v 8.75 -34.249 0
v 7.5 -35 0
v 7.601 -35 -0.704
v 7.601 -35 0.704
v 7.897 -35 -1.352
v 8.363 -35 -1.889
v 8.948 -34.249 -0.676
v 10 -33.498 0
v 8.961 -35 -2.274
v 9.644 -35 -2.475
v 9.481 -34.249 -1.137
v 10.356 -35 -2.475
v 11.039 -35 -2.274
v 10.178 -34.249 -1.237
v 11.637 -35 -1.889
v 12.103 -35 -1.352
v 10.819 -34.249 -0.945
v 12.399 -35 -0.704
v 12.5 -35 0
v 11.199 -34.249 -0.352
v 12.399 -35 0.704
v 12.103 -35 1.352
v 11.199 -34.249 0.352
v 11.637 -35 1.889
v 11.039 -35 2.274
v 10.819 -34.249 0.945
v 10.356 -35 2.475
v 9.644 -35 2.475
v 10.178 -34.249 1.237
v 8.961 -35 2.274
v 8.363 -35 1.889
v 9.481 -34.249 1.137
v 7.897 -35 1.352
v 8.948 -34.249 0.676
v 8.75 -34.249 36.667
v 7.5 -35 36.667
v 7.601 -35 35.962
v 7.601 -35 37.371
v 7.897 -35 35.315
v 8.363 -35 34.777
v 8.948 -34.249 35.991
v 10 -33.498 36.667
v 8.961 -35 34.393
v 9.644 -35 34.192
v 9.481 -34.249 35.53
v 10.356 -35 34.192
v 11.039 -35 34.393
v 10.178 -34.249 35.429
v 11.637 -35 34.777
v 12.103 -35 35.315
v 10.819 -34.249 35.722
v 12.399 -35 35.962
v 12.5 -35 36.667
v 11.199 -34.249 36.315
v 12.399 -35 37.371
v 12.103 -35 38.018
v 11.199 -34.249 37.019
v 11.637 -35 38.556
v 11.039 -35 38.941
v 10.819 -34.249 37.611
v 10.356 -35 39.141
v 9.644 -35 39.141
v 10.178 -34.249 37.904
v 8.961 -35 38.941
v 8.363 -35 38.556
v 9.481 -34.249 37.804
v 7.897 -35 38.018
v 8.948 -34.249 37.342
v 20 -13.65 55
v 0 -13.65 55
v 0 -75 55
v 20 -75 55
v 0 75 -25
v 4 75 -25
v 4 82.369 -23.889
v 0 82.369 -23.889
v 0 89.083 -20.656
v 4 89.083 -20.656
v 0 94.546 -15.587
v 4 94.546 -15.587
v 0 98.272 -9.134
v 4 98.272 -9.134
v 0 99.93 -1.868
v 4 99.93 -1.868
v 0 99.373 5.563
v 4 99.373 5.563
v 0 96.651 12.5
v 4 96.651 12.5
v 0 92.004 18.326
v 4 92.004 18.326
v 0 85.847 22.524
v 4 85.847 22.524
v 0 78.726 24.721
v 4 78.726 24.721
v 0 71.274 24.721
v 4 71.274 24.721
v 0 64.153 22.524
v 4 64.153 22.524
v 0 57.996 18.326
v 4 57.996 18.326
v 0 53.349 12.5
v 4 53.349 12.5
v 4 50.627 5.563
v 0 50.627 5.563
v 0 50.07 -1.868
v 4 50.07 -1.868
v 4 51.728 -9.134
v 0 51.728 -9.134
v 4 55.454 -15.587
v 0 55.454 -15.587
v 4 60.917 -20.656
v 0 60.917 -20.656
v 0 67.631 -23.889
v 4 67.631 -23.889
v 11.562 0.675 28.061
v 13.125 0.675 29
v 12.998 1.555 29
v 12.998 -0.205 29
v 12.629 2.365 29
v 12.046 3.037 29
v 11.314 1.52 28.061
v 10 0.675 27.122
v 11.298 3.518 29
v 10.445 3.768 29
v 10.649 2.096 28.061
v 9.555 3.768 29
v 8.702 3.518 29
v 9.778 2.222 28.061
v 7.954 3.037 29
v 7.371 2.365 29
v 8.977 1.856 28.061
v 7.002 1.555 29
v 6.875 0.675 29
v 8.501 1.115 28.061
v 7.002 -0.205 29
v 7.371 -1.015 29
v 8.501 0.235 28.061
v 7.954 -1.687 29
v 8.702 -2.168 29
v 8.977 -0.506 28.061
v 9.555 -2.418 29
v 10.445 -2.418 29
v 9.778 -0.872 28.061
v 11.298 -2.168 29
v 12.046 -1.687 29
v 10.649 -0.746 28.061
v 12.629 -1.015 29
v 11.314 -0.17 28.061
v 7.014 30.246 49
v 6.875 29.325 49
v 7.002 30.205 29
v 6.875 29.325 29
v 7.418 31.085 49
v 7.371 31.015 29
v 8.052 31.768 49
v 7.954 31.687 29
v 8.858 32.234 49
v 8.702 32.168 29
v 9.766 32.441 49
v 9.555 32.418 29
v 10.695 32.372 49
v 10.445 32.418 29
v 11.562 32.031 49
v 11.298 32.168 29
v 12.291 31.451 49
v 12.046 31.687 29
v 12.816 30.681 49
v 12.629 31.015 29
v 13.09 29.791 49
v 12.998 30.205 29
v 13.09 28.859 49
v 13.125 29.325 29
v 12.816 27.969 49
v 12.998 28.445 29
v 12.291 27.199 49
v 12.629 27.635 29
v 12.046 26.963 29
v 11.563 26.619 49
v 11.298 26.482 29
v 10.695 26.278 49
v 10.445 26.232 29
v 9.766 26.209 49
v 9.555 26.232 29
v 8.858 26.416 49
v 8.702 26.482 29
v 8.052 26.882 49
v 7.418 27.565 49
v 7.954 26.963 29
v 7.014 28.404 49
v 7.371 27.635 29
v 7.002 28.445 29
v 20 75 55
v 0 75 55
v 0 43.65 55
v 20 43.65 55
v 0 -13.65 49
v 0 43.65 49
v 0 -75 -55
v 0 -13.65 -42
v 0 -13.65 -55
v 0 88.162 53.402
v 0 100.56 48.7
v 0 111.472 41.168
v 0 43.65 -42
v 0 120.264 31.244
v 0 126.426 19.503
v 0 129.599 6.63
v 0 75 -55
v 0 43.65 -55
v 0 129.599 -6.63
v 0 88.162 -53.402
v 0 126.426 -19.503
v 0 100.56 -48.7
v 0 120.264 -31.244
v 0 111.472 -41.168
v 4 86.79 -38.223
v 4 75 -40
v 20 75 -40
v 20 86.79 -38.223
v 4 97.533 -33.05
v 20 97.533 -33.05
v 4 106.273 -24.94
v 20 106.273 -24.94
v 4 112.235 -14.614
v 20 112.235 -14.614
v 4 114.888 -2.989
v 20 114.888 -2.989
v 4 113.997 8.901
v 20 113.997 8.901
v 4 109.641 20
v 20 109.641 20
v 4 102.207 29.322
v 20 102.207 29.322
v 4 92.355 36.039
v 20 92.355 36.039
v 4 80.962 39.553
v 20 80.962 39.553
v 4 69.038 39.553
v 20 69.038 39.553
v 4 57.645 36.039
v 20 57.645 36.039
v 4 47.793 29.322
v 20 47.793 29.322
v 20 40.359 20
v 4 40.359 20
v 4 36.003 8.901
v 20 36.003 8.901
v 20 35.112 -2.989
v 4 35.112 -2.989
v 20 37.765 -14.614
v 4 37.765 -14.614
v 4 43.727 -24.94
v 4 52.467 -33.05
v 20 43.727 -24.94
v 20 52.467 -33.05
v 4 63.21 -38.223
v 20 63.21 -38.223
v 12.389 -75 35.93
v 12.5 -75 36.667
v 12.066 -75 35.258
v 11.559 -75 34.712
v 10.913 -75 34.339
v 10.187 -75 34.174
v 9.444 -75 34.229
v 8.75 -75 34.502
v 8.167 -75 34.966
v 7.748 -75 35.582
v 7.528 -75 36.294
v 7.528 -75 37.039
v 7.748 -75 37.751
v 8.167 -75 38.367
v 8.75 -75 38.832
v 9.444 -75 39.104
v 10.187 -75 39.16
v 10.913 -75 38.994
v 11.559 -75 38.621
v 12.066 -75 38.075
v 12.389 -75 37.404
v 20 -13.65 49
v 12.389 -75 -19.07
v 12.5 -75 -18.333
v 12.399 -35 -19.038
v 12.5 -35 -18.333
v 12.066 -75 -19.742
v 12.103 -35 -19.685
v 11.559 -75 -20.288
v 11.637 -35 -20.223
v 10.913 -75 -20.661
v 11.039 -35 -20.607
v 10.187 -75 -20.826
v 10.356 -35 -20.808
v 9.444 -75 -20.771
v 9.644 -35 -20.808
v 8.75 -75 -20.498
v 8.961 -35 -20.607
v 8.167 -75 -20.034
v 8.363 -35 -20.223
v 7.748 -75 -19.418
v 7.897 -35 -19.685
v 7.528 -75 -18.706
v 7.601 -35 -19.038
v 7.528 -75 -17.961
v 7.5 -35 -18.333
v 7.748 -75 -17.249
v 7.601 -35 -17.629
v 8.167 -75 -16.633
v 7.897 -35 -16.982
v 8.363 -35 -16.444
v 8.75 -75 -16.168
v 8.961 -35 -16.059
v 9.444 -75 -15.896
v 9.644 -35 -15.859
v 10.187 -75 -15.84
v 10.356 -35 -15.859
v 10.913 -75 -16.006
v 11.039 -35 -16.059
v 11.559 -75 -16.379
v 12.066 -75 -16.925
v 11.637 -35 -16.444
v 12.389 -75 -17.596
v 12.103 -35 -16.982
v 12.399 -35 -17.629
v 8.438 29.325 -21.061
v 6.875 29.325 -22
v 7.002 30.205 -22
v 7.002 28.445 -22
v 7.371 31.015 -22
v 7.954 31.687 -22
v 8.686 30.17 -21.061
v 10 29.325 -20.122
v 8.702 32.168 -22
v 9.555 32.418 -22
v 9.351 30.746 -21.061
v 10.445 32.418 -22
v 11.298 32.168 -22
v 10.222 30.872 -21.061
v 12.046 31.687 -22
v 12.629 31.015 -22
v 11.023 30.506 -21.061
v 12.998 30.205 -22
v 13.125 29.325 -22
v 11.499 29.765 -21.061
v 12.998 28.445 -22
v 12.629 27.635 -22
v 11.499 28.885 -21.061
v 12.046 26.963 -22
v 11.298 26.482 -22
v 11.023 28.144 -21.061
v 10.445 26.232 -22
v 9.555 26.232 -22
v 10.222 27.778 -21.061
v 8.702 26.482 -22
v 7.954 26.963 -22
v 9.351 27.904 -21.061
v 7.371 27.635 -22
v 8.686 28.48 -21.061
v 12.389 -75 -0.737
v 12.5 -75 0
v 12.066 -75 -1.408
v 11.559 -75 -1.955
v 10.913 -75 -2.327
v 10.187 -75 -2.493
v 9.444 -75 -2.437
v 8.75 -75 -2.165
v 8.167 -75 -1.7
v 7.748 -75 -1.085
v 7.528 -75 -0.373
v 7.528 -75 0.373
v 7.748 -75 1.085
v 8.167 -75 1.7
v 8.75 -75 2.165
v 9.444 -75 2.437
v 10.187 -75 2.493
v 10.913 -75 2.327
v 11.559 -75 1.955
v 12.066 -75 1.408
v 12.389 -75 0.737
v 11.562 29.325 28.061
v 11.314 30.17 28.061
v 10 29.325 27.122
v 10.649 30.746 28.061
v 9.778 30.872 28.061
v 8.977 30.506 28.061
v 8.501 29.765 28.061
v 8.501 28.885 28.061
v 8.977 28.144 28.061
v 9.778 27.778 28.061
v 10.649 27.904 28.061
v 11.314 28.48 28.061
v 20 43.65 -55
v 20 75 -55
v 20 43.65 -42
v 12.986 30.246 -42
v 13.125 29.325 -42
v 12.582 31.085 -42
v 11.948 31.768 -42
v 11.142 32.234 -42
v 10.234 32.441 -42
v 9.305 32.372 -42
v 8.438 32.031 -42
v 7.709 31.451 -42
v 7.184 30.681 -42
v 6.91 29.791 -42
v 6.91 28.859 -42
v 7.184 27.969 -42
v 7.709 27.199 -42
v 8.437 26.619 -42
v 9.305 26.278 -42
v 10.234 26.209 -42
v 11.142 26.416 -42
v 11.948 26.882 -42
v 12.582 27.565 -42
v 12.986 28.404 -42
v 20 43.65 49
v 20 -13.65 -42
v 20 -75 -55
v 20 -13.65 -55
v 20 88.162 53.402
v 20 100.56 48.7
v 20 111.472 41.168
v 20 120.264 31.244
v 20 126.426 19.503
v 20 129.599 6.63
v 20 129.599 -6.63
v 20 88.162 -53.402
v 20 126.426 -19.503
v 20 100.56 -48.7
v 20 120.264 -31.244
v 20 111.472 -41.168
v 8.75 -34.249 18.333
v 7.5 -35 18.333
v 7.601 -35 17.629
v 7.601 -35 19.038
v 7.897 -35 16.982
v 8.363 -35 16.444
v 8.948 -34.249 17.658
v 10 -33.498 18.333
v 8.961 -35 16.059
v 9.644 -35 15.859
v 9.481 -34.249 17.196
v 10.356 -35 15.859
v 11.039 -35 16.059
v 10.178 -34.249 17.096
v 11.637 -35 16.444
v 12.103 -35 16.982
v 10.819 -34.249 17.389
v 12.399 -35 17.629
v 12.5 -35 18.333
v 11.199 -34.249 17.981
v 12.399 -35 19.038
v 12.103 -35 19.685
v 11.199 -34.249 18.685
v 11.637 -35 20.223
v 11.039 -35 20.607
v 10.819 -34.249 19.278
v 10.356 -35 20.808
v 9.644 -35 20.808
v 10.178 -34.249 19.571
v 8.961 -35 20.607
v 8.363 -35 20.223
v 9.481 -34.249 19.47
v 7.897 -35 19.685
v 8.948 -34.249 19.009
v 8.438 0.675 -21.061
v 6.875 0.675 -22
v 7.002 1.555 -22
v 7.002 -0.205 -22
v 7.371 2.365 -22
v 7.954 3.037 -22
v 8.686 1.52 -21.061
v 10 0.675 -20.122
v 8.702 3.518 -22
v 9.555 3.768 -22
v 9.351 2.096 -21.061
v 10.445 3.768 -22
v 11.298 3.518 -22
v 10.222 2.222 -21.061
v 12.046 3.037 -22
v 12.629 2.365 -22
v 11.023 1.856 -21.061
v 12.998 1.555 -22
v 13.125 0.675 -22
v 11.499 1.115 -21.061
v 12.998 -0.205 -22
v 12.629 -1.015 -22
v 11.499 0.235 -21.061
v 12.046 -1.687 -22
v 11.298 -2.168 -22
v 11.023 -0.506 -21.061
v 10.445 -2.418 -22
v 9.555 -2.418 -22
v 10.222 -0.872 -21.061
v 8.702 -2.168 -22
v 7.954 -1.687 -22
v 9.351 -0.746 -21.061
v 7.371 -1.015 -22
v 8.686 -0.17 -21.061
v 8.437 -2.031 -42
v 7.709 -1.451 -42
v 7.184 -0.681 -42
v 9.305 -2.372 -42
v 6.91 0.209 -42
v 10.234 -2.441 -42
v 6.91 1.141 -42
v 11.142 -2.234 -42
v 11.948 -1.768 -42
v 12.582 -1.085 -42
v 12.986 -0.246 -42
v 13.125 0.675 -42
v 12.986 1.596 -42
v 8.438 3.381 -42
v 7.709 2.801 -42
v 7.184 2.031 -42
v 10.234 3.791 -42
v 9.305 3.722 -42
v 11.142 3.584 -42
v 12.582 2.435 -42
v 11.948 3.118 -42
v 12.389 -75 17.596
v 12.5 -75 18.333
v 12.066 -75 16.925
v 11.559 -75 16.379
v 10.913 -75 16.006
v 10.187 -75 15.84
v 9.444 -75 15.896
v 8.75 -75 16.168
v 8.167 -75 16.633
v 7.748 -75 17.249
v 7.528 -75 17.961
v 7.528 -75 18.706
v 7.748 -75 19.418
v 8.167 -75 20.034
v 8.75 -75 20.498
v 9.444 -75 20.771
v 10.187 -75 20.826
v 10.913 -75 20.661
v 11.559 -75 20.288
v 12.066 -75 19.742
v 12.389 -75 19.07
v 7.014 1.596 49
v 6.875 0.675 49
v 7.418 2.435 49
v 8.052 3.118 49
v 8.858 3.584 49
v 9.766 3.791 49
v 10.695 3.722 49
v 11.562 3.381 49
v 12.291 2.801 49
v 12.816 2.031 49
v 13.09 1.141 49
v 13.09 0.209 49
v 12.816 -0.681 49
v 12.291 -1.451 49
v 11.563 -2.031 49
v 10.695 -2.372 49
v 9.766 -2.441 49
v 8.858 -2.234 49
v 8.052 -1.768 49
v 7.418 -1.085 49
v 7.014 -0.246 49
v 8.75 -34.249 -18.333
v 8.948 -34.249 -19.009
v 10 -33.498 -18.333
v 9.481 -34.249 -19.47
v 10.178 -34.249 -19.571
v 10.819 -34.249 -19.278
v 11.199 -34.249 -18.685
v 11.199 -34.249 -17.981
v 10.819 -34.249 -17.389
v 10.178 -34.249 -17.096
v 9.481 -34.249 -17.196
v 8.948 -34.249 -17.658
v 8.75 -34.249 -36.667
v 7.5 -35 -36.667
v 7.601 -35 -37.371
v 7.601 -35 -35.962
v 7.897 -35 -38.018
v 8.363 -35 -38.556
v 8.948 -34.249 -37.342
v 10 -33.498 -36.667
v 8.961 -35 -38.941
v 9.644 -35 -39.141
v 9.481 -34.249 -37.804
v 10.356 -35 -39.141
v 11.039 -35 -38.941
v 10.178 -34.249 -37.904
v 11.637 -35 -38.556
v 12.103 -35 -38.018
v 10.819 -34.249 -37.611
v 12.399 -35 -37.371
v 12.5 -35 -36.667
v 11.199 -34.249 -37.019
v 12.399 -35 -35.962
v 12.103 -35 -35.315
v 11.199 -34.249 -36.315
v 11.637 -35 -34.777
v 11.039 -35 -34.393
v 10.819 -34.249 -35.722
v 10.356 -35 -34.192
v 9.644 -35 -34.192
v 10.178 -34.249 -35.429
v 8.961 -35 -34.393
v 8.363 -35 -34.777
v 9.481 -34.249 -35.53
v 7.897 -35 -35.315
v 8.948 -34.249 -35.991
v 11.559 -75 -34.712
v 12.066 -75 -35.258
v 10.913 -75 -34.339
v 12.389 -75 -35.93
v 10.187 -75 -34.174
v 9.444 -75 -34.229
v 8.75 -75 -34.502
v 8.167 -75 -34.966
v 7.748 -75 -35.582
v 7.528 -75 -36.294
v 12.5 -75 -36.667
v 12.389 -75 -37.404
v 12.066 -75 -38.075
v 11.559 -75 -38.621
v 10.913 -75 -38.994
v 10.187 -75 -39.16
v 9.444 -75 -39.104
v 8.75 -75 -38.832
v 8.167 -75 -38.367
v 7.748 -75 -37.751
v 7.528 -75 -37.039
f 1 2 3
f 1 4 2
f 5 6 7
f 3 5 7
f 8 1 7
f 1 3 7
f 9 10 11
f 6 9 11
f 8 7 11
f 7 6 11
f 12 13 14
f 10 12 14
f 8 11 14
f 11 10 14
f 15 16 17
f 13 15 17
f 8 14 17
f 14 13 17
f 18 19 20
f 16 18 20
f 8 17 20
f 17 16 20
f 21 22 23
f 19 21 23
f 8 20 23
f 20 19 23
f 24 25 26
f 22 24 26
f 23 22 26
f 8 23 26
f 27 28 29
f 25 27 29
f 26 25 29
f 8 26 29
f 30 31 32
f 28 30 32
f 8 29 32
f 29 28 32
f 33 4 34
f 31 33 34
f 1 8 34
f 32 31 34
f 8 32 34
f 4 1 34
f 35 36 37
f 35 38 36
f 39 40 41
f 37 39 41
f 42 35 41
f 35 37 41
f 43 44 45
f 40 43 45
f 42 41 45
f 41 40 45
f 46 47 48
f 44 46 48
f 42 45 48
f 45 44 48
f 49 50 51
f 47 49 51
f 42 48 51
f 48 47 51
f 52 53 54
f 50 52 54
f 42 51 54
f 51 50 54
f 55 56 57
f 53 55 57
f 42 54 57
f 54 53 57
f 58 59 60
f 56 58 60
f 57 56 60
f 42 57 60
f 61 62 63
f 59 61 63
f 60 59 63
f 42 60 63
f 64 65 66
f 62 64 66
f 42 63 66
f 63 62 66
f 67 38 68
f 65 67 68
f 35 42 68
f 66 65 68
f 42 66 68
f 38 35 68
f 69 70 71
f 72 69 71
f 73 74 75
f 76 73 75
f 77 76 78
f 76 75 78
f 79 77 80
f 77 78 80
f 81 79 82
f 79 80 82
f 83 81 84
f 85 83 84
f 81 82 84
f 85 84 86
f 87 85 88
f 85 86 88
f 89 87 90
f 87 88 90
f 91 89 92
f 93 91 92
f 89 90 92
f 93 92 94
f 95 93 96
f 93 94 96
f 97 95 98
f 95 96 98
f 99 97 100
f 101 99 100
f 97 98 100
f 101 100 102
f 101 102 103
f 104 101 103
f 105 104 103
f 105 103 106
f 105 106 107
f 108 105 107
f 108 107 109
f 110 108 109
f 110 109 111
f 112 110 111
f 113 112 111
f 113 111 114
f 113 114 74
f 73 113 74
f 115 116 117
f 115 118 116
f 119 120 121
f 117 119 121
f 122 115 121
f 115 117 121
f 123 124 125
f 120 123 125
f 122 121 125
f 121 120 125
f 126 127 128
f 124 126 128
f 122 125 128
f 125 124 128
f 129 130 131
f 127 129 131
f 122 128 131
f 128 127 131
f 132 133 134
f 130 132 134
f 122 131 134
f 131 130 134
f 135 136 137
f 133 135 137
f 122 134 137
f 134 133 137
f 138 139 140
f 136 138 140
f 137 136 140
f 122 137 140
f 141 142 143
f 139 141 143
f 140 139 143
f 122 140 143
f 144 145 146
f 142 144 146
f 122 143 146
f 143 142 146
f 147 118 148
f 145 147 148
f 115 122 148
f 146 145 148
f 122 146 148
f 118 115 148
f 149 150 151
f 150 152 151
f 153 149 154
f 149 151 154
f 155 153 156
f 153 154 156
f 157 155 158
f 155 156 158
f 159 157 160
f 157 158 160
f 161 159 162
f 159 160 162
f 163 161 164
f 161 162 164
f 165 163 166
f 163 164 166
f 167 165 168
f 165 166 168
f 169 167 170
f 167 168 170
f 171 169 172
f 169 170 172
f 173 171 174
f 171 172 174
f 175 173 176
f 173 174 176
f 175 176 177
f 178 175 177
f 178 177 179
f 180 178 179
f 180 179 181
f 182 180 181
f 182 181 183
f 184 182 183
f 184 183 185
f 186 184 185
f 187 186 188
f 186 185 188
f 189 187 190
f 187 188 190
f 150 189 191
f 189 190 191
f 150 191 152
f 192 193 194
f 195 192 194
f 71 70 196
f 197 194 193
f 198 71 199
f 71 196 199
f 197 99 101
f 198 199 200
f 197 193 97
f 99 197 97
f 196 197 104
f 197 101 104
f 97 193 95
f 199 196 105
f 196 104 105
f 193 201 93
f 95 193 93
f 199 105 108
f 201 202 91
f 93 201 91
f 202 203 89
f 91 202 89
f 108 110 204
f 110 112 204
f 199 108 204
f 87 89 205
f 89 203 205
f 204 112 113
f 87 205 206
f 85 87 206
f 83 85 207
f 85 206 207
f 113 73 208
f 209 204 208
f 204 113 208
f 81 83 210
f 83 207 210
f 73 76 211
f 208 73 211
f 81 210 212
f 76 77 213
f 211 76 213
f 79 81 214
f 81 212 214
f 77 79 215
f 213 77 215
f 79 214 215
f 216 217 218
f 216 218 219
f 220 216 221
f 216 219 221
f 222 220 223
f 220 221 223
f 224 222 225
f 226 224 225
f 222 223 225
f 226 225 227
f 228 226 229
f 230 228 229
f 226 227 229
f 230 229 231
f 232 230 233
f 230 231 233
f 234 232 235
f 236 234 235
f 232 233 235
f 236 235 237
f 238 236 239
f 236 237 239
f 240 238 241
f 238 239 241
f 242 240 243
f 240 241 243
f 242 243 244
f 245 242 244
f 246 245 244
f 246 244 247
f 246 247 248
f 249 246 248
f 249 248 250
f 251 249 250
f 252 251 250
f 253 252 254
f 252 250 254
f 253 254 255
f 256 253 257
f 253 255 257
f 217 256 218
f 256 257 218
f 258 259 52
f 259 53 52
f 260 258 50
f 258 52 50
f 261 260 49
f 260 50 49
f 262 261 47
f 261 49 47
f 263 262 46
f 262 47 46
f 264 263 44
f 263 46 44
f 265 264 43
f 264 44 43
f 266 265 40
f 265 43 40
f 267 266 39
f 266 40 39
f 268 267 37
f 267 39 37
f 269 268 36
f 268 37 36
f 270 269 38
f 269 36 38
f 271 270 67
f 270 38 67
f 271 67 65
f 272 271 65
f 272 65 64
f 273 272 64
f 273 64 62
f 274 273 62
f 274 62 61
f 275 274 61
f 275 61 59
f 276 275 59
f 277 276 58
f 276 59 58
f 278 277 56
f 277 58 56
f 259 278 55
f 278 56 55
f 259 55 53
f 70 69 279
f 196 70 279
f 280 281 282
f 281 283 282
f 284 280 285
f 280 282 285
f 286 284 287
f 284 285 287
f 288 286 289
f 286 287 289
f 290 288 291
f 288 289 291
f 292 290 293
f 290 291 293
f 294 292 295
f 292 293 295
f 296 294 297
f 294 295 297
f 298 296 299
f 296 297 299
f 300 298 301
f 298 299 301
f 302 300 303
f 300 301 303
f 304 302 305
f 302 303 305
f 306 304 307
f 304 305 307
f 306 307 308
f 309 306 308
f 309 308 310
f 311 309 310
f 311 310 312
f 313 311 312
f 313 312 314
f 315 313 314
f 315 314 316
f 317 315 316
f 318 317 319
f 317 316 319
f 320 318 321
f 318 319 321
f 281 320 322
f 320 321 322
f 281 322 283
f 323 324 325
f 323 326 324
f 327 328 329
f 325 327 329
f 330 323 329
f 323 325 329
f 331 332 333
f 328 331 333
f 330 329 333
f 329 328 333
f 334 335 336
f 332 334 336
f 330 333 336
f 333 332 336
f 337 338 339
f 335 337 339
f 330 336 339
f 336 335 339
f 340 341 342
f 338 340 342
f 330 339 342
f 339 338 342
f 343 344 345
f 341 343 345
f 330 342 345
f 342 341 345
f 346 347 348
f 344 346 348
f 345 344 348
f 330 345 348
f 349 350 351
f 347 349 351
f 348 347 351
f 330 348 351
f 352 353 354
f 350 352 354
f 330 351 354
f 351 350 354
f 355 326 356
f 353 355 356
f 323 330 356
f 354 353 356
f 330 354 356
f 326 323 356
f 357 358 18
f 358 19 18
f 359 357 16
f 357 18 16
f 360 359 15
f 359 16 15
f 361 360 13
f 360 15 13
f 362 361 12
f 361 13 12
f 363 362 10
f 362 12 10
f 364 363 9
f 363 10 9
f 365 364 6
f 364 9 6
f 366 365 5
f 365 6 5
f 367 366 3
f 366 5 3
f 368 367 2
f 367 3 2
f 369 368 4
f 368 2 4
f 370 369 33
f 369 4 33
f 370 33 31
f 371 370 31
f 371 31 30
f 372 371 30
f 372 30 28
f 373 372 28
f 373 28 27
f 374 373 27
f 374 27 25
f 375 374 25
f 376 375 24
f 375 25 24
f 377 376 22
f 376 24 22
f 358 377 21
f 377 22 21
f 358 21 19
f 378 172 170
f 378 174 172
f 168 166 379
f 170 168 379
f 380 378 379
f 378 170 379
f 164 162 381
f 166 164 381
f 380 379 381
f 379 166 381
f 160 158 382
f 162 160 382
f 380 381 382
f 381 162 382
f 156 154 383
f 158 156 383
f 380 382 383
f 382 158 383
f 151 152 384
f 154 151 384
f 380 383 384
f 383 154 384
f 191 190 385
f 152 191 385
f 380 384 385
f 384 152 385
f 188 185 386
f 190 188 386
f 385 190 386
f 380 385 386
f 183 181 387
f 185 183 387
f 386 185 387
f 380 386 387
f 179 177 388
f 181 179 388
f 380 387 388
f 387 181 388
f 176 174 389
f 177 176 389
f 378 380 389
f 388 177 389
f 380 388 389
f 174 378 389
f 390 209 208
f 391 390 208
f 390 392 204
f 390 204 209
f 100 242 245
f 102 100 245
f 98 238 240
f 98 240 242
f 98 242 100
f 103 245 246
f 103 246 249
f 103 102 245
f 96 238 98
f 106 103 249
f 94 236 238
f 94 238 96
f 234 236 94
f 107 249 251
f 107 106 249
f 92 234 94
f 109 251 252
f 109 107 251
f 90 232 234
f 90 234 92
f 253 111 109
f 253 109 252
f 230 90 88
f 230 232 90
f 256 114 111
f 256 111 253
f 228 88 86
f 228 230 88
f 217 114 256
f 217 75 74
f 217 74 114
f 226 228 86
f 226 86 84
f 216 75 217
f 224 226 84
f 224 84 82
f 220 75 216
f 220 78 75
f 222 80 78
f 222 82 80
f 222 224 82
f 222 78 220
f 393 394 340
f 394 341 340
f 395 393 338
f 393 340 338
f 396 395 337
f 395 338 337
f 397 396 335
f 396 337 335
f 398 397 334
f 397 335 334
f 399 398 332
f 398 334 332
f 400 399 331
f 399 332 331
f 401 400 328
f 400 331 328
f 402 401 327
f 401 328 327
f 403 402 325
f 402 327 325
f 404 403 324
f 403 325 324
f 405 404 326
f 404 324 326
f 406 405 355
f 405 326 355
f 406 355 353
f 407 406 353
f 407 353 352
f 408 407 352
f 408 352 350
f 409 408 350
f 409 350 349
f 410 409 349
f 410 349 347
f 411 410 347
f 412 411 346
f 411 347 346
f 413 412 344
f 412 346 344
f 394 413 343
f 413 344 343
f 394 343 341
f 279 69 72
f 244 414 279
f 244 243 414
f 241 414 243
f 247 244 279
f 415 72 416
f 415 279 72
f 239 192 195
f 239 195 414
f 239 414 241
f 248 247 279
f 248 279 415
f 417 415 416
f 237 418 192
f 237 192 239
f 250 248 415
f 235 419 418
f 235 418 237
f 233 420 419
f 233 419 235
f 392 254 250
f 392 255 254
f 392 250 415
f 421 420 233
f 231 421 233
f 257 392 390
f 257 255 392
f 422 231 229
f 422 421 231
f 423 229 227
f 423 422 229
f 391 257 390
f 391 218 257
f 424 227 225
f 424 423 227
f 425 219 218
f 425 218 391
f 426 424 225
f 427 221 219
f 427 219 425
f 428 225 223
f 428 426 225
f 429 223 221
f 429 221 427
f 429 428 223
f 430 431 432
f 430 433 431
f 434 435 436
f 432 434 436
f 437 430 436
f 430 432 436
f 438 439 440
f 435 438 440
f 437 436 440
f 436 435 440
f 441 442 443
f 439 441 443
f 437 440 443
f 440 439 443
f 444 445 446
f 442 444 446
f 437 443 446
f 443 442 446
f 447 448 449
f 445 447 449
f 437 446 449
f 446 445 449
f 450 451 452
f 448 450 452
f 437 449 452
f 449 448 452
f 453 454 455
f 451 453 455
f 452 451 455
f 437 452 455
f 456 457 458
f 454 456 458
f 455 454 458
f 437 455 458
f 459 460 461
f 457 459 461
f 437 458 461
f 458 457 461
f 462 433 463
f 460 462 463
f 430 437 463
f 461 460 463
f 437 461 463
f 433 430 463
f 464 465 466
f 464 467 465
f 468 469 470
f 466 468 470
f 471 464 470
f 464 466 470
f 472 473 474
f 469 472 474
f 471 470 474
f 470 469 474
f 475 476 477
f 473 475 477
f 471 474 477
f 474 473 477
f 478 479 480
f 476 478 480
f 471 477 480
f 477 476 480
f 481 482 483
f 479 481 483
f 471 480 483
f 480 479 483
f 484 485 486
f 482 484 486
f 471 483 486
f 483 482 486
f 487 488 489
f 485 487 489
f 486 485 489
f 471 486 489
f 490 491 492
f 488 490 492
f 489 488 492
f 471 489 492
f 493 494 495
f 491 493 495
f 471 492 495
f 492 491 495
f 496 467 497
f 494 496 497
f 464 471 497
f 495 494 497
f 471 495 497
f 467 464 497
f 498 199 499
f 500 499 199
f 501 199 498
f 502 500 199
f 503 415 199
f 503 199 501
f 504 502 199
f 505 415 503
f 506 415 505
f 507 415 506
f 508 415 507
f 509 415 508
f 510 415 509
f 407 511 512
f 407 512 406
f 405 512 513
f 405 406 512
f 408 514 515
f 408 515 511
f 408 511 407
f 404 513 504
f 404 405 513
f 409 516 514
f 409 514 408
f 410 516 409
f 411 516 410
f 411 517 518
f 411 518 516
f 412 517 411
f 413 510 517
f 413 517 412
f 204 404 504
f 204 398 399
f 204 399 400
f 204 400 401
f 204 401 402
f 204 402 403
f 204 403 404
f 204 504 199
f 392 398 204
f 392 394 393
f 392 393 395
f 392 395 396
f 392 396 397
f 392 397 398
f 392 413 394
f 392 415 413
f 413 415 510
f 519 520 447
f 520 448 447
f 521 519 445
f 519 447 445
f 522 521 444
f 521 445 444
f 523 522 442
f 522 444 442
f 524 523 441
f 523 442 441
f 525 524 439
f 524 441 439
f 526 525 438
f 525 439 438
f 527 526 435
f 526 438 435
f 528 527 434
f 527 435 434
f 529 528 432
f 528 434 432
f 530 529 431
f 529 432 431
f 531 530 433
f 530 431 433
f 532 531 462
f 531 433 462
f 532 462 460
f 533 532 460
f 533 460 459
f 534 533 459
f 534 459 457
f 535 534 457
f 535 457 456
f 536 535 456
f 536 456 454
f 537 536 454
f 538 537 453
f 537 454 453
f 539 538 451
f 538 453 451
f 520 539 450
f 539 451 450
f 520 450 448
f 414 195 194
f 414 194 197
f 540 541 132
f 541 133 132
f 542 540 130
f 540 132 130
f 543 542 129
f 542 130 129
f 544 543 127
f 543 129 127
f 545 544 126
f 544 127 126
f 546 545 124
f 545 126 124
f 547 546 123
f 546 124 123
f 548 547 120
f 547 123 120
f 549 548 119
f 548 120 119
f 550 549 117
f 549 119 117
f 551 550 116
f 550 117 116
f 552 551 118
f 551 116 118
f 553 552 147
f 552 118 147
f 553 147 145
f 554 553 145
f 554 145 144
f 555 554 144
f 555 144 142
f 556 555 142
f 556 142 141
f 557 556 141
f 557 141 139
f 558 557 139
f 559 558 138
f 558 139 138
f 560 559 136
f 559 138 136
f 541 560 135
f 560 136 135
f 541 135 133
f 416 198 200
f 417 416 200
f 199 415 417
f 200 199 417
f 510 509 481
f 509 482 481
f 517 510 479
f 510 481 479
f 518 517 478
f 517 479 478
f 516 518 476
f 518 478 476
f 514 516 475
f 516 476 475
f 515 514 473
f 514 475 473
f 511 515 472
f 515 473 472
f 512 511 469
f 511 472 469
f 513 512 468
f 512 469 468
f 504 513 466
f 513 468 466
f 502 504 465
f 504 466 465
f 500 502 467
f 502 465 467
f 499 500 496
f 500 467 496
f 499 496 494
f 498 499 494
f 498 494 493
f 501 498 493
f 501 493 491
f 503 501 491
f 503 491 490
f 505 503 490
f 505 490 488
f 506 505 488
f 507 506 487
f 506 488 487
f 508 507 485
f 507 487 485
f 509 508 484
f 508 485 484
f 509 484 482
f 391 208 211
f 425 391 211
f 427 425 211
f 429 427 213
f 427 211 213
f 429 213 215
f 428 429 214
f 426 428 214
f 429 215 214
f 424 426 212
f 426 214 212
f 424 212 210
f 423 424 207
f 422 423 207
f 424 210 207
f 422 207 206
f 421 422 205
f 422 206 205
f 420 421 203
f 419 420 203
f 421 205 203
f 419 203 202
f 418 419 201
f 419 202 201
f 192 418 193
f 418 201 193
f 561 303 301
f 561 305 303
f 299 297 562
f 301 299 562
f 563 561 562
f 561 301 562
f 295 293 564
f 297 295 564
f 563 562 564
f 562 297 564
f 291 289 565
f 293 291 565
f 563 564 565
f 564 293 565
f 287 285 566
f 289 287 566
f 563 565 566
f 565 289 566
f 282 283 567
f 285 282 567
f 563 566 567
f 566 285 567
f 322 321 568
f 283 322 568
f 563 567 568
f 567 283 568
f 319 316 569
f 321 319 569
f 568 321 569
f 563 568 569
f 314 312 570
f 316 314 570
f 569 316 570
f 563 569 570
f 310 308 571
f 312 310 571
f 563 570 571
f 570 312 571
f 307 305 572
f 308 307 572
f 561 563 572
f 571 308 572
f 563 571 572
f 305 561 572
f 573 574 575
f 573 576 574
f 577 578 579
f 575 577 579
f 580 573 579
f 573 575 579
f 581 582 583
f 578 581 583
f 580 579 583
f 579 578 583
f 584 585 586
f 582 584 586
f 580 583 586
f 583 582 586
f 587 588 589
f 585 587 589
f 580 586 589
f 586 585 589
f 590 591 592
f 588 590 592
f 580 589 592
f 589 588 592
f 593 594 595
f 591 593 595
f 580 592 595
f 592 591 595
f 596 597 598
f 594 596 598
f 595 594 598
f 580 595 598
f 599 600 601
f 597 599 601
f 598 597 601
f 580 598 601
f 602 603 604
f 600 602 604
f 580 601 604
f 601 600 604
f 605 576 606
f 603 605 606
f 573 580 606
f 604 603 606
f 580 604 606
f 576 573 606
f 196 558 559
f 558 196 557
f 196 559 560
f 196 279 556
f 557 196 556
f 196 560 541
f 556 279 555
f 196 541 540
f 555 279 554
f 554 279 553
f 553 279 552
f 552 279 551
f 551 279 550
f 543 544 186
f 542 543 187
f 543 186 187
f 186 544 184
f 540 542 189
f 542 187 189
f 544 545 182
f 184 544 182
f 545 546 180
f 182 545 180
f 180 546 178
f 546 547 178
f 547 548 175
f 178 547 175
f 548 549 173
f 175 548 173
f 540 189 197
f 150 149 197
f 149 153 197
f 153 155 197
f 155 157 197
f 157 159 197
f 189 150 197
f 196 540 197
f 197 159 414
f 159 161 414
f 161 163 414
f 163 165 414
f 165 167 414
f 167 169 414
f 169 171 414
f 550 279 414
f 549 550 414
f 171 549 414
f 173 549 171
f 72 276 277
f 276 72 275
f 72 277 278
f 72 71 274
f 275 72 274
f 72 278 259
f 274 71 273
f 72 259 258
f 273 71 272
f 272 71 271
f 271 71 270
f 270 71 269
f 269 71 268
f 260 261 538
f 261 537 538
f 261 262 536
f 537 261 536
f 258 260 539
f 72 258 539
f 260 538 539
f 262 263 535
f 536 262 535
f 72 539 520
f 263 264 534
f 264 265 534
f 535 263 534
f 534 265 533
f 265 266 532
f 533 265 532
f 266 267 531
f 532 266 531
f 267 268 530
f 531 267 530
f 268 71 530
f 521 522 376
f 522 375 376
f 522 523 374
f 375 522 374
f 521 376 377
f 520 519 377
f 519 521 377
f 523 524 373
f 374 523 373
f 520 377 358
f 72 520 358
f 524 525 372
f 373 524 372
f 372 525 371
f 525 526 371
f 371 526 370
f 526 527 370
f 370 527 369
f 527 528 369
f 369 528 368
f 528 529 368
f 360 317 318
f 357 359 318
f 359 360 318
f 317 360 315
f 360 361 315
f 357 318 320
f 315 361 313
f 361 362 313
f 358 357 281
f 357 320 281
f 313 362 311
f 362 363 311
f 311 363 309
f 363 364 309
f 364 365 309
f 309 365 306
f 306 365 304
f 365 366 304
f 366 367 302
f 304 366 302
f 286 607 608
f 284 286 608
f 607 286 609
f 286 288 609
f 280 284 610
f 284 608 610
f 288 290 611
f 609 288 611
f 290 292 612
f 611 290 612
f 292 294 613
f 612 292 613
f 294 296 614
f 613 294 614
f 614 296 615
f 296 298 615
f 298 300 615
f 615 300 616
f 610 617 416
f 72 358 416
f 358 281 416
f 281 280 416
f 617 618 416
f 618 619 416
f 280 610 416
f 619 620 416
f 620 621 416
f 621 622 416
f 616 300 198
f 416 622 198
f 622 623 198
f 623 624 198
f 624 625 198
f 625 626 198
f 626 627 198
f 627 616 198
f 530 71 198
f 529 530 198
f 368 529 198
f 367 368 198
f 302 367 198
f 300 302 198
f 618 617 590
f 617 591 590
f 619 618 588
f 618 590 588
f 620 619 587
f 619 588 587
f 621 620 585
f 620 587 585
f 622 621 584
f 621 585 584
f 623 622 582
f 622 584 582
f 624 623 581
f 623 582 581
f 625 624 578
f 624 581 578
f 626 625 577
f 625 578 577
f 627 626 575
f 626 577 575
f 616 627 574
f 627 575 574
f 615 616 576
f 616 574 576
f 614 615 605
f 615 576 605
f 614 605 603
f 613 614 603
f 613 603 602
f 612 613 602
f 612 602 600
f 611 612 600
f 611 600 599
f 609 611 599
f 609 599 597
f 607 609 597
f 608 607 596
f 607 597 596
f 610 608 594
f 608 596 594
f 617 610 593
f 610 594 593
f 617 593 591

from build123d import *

# Parameters (mm, degrees)
BOSS_EXTRUDE1_DEPTH              = 20
SKETCH3_R                        = 40
CUT_EXTRUDE1_DEPTH               = 16
SKETCH4_R                        = 25
CUT_EXTRUDE2_DEPTH               = 11.1125
TAP_DRILL_FOR_M6X1_0_TAP2_D      = 5
TAP_DRILL_FOR_M6X1_0_TAP2_DEPTH  = 40
TAP_DRILL_FOR_M6X1_0_TAP2_TIP    = 1.502151548
SKETCH12_W                       = 6
SKETCH12_H                       = 57.3
SKETCH12_W_2                     = 13
CUT_EXTRUDE3_DEPTH               = 20
TAP_DRILL_FOR_M6_HELICOIL1_D     = 6.25
TAP_DRILL_FOR_M6_HELICOIL1_DEPTH = 20
TAP_DRILL_FOR_M6_HELICOIL1_TIP   = 1.877689434
TAP_DRILL_FOR_M6_HELICOIL2_D     = 6.25
TAP_DRILL_FOR_M6_HELICOIL2_DEPTH = 20
TAP_DRILL_FOR_M6_HELICOIL2_TIP   = 1.877689434


with BuildPart() as part:
    # Sketch2 → Boss-Extrude1 (new body)
    with BuildSketch(Plane(origin=(0, 0, 0), x_dir=(0, 0, -1), z_dir=(1, 0, 0))):
        with BuildLine():
            Line((55, -75), (55, 75))
            ThreePointArc((55, 75), (0, 20), (-55, 75))
            Line((-55, 75), (-55, -75))
            Line((-55, -75), (55, -75))
        make_face()
        with BuildLine():
            ThreePointArc((-55, 75), (0, 20), (55, 75))
            Line((55, 75), (-55, 75))
        make_face()
        with BuildLine():
            Line((-55, 75), (55, 75))
            ThreePointArc((55, 75), (0, 130), (-55, 75))
        make_face()
    extrude(amount=BOSS_EXTRUDE1_DEPTH)

    # Sketch3 → Cut-Extrude1 (cut)
    with BuildSketch(Plane(origin=(20, 0, 0), x_dir=(0, 0, -1), z_dir=(1, 0, 0))):
        with Locations((0, 75)):
            Circle(SKETCH3_R)
    extrude(amount=-CUT_EXTRUDE1_DEPTH, mode=Mode.SUBTRACT)

    # Sketch4 → Cut-Extrude2 (cut)
    with BuildSketch(Plane(origin=(4, 0, 0), x_dir=(0, 0, -1), z_dir=(1, 0, 0))):
        with Locations((0, 75)):
            Circle(SKETCH4_R)
    extrude(amount=-CUT_EXTRUDE2_DEPTH, mode=Mode.SUBTRACT)

    # Tap Drill for M6x1.0 Tap2
    with Locations(Plane(origin=(0, -75, 0), x_dir=(-1, 0, 0), z_dir=(0, -1, 0))):
        with Locations((-10, -36.666666667), (-10, -18.333333333), (-10, 0), (-10, 18.333333333), (-10, 36.666666667)):
            Hole(TAP_DRILL_FOR_M6X1_0_TAP2_D / 2, depth=TAP_DRILL_FOR_M6X1_0_TAP2_DEPTH)
            with Locations((0, 0, -(TAP_DRILL_FOR_M6X1_0_TAP2_DEPTH + TAP_DRILL_FOR_M6X1_0_TAP2_TIP / 2))):  # 118° drill point
                Cone(0, TAP_DRILL_FOR_M6X1_0_TAP2_D / 2, TAP_DRILL_FOR_M6X1_0_TAP2_TIP, mode=Mode.SUBTRACT)

    # Sketch12 → Cut-Extrude3 (cut)
    with BuildSketch(Plane(origin=(20, 0, 0), x_dir=(0, 0, -1), z_dir=(1, 0, 0))):
        with Locations((-52, 15)):
            Rectangle(SKETCH12_W, SKETCH12_H)
        with Locations((48.5, 15)):
            Rectangle(SKETCH12_W_2, SKETCH12_H)
    extrude(amount=-CUT_EXTRUDE3_DEPTH, mode=Mode.SUBTRACT)

    # Tap Drill for M6 Helicoil1
    with Locations(Plane(origin=(10, 29.325, 49), x_dir=(1, 0, 0), z_dir=(0, 0, 1))):
        with Locations((0, 0), (0, -28.65)):
            Hole(TAP_DRILL_FOR_M6_HELICOIL1_D / 2, depth=TAP_DRILL_FOR_M6_HELICOIL1_DEPTH)
            with Locations((0, 0, -(TAP_DRILL_FOR_M6_HELICOIL1_DEPTH + TAP_DRILL_FOR_M6_HELICOIL1_TIP / 2))):  # 118° drill point
                Cone(0, TAP_DRILL_FOR_M6_HELICOIL1_D / 2, TAP_DRILL_FOR_M6_HELICOIL1_TIP, mode=Mode.SUBTRACT)

    # Tap Drill for M6 Helicoil2
    with Locations(Plane(origin=(0, 0, -42), x_dir=(-1, 0, 0), z_dir=(0, 0, -1))):
        with Locations((-10, 29.325), (-10, 0.675)):
            Hole(TAP_DRILL_FOR_M6_HELICOIL2_D / 2, depth=TAP_DRILL_FOR_M6_HELICOIL2_DEPTH)
            with Locations((0, 0, -(TAP_DRILL_FOR_M6_HELICOIL2_DEPTH + TAP_DRILL_FOR_M6_HELICOIL2_TIP / 2))):  # 118° drill point
                Cone(0, TAP_DRILL_FOR_M6_HELICOIL2_D / 2, TAP_DRILL_FOR_M6_HELICOIL2_TIP, mode=Mode.SUBTRACT)


solid = part.part
